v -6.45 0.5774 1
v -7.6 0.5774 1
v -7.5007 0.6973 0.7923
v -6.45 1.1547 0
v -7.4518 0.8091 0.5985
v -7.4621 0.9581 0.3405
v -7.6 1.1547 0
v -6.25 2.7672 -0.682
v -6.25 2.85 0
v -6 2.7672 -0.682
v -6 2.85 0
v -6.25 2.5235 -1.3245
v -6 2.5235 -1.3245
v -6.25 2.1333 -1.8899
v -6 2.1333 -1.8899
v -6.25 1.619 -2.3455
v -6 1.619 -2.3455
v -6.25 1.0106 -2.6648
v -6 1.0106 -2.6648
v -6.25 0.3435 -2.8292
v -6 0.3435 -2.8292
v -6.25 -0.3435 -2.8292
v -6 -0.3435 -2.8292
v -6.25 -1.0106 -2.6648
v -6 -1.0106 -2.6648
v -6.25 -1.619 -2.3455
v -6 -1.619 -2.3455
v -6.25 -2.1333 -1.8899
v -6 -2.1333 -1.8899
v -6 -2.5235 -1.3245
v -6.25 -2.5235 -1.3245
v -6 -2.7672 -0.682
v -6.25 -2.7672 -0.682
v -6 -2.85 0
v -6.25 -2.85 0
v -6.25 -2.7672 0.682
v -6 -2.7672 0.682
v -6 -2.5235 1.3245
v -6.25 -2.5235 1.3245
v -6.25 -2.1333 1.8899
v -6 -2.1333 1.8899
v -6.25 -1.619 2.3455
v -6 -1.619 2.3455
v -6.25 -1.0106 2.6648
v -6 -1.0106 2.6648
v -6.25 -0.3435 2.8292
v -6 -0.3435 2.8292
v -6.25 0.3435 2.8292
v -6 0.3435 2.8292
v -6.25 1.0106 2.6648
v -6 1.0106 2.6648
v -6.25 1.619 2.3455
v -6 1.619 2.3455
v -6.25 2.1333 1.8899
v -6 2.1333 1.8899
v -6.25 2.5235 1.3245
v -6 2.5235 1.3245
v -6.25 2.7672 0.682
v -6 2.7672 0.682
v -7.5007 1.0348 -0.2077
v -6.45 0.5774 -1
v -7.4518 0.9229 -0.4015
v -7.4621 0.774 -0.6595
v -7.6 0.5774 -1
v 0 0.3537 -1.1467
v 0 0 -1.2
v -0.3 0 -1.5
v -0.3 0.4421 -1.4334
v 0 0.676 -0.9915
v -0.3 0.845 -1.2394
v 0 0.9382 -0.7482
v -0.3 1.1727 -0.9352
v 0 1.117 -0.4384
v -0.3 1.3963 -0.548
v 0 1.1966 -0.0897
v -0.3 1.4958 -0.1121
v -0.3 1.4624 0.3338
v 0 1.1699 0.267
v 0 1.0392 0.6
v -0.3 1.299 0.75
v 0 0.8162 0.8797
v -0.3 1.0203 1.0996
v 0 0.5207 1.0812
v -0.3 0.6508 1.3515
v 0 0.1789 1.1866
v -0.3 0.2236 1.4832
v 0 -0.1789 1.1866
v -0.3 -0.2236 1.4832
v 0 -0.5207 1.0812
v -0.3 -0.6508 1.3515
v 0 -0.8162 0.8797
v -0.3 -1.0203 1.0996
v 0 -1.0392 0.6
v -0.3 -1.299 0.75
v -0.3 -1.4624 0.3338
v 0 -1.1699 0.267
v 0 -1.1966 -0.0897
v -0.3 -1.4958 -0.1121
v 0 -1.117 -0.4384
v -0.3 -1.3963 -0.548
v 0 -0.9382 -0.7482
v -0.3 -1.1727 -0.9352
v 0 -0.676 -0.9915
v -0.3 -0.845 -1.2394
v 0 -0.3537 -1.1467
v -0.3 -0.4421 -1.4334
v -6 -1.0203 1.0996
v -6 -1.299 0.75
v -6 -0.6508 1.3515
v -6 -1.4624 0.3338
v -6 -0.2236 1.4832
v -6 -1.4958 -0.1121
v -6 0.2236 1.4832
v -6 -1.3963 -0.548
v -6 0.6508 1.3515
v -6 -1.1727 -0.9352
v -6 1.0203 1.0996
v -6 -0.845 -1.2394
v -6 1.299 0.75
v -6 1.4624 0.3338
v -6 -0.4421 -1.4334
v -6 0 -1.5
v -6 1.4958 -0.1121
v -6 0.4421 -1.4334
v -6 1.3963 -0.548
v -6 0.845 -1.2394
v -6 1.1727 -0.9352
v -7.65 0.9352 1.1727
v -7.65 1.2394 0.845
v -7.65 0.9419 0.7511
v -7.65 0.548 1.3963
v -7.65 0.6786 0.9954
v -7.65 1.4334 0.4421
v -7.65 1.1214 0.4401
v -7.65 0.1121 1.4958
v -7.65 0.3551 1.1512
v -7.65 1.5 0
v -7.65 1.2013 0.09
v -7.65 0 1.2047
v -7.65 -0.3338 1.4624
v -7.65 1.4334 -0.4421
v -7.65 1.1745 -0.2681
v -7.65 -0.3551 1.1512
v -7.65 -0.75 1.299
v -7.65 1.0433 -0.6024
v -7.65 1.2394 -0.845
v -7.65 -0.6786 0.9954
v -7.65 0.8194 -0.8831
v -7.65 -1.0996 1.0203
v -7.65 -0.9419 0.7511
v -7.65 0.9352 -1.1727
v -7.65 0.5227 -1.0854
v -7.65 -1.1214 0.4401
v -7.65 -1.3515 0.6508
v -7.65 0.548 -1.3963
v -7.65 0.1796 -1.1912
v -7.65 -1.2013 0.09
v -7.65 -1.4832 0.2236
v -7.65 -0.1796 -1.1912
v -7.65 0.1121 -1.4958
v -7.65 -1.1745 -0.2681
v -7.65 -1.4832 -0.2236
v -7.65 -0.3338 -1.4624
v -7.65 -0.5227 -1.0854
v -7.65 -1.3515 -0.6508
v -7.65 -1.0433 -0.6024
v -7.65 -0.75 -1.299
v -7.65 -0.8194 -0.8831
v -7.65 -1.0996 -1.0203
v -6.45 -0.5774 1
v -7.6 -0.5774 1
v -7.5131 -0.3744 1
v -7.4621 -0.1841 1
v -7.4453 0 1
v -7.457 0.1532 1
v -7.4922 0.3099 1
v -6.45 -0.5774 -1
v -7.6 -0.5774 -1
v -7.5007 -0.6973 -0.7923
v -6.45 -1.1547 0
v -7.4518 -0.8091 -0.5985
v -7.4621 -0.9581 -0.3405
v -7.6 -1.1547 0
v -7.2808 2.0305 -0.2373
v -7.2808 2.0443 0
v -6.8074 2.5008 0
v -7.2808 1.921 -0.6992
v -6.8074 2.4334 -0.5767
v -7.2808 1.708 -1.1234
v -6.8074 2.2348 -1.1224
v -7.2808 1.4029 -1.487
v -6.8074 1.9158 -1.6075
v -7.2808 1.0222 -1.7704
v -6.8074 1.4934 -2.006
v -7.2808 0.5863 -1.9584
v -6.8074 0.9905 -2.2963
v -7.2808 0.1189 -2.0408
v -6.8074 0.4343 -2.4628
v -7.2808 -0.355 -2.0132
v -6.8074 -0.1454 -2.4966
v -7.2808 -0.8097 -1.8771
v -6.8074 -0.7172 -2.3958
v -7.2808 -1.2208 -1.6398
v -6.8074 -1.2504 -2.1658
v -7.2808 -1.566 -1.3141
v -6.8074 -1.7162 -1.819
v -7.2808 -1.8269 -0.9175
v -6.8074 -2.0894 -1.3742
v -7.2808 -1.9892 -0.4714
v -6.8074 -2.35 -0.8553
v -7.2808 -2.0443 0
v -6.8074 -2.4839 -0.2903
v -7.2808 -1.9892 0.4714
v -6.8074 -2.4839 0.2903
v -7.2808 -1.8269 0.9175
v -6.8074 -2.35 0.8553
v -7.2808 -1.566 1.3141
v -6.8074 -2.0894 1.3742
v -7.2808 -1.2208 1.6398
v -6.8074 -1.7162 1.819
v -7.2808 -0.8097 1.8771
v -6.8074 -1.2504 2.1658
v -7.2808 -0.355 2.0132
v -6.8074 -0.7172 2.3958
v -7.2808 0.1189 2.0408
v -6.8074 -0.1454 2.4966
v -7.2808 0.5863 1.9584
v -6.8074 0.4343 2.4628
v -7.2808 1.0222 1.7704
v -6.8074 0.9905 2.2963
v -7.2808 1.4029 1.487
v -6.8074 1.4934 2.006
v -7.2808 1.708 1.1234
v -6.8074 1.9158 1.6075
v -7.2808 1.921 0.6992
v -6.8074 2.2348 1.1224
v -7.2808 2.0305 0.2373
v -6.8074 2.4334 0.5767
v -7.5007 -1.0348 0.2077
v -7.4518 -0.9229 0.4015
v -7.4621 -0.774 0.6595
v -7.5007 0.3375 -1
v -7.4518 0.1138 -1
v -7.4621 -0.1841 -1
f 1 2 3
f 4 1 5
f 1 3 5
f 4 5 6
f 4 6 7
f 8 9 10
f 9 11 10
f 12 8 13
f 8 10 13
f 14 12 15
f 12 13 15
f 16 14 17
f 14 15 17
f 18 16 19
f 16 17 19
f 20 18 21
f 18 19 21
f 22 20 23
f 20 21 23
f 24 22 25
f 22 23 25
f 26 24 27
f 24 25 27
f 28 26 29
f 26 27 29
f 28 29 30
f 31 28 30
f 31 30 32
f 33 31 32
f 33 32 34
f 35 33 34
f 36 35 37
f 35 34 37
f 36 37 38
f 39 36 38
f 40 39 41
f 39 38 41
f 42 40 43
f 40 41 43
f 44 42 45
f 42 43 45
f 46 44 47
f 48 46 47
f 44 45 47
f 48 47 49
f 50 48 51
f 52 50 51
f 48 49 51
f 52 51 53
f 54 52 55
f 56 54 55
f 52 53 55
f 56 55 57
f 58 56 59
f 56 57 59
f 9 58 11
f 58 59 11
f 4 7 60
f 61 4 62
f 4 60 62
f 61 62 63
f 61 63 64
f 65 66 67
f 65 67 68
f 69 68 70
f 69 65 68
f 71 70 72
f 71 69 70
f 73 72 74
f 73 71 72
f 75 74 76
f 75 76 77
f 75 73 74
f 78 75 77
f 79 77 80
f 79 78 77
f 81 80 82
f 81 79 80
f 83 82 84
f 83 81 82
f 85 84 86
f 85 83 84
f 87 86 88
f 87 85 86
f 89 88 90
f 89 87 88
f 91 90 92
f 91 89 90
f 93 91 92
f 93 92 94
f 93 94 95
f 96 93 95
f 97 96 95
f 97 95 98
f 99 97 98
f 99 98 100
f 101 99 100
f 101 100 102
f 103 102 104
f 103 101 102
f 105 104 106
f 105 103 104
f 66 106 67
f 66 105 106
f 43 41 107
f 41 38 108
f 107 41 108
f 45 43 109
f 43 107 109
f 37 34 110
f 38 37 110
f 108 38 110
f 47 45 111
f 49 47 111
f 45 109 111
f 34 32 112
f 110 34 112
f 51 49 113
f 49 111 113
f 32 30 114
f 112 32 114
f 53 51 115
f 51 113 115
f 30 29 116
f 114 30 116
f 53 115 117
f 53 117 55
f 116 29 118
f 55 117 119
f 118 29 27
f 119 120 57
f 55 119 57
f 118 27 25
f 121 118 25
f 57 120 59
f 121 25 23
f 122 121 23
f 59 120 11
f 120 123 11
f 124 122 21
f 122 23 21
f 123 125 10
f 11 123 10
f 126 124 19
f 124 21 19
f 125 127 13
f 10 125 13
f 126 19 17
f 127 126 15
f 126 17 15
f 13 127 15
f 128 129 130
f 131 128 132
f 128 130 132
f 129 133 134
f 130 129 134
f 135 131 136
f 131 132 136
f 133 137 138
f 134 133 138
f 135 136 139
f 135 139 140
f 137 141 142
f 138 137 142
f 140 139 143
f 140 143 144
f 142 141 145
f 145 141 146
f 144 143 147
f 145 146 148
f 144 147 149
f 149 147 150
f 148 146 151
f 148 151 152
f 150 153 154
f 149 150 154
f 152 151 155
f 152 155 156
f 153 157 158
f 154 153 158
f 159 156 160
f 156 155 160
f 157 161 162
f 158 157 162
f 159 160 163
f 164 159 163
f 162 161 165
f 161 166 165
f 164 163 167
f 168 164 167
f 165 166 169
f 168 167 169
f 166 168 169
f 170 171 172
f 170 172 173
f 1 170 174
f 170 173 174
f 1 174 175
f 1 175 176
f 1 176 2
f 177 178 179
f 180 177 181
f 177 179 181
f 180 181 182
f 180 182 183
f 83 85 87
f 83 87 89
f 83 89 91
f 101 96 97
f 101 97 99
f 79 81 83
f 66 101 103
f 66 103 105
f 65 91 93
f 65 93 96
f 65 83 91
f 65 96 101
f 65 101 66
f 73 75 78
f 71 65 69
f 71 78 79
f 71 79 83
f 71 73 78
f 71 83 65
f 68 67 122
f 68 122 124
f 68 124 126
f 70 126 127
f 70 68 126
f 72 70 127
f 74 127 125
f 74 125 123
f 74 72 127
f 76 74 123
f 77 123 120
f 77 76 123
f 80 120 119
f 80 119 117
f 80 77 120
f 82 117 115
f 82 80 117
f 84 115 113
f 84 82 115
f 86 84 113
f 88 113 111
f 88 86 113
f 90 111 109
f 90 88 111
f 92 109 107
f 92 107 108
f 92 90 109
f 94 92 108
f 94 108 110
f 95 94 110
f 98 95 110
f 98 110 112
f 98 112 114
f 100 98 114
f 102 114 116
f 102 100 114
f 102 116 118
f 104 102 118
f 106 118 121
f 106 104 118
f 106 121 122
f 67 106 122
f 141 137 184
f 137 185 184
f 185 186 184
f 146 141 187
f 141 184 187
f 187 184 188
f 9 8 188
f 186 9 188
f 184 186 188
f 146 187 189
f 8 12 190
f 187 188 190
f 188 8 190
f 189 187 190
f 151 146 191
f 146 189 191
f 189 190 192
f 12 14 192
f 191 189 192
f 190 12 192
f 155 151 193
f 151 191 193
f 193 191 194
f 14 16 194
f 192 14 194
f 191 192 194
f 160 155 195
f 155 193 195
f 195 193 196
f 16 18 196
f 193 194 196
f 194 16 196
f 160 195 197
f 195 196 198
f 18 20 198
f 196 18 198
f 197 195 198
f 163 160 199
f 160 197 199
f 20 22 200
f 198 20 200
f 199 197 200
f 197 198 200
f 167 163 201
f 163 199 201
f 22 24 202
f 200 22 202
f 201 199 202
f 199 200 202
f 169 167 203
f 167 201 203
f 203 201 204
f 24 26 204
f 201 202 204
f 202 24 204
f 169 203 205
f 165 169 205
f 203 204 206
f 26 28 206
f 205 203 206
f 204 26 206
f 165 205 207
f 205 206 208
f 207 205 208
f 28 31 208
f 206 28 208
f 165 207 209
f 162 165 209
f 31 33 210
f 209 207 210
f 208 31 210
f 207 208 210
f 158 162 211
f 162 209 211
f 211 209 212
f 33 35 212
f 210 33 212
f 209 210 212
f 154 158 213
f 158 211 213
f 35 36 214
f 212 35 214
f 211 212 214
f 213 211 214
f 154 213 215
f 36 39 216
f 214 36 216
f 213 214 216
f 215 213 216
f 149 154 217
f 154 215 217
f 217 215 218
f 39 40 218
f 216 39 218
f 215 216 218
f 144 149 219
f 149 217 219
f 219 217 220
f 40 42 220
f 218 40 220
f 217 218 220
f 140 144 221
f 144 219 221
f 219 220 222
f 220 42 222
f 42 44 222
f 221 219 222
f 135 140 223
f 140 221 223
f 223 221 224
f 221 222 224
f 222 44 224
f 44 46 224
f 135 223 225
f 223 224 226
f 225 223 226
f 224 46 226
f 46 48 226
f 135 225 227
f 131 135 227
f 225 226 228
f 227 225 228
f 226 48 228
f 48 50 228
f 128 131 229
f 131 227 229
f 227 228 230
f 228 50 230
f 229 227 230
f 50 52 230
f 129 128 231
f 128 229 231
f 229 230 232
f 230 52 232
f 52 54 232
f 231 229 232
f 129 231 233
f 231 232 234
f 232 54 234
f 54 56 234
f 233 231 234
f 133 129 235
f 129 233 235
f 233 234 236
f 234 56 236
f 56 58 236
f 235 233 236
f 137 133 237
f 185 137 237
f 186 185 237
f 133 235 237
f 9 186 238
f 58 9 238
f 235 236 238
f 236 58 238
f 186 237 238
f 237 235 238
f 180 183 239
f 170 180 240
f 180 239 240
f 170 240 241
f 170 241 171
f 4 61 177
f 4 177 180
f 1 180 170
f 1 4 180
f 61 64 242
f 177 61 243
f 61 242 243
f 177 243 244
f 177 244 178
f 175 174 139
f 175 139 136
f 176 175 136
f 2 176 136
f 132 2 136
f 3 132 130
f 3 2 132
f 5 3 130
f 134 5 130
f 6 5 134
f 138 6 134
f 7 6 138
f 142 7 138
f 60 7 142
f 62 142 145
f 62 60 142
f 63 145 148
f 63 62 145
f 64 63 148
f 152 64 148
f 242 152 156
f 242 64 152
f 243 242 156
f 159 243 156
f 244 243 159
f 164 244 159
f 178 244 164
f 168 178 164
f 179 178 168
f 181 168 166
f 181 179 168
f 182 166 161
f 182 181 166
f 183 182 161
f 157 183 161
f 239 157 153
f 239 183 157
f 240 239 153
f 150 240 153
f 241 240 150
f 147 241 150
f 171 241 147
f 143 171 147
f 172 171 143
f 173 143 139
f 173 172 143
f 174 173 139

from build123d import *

# Parameters (mm, degrees)
SKETCH2_R           = 1.5
BOSS_EXTRUDE1_DEPTH = 6
CHAMFER1_SIZE       = 0.3
CUT_EXTRUDE1_DEPTH  = 1.2
SKETCH8_R           = 1.204700538
CUT_EXTRUDE2_DEPTH  = 1
CUT_EXTRUDE2_TAPER  = 45


with BuildPart() as part:
    # Sketch2 → Boss-Extrude1 (new body)
    with BuildSketch(Plane(origin=(0, 0, 0), x_dir=(0, 0, -1), z_dir=(1, 0, 0))):
        Circle(SKETCH2_R)
    extrude(amount=-BOSS_EXTRUDE1_DEPTH)

    # Chamfer1
    chamfer1_edges = [part.edges().sort_by_distance(p)[0] for p in [
        (0, 0, 1.5),
    ]]
    chamfer(chamfer1_edges, length=CHAMFER1_SIZE)

    # Sketch6 → Revolve1 (revolve)
    with BuildSketch(Plane.XY):
        with BuildLine():
            Line((-7.65, 0), (-7.65, 1.5))
            ThreePointArc((-7.65, 1.5), (-7.055944823, 2.284868705), (-6.25, 2.85))
            Line((-6.25, 2.85), (-6, 2.85))
            Line((-6, 2.85), (-6, 0))
            Line((-6, 0), (-7.65, 0))
        make_face()
    revolve(axis=Axis((-6, 0, 0), (-1, 0, 0)))

    # Sketch7 → Cut-Extrude1 (cut)
    with BuildSketch(Plane.ZY.offset(7.65)):
        Polygon((0, 1.154700538), (-1, 0.577350269), (-1, -0.577350269), (0, -1.154700538), (1, -0.577350269), (1, 0.577350269), align=None)
    extrude(amount=-CUT_EXTRUDE1_DEPTH, mode=Mode.SUBTRACT)

    # Sketch8 → Cut-Extrude2 (cut)
    with BuildSketch(Plane.ZY.offset(7.65)):
        Circle(SKETCH8_R)
    extrude(amount=-CUT_EXTRUDE2_DEPTH, taper=CUT_EXTRUDE2_TAPER, mode=Mode.SUBTRACT)


solid = part.part
